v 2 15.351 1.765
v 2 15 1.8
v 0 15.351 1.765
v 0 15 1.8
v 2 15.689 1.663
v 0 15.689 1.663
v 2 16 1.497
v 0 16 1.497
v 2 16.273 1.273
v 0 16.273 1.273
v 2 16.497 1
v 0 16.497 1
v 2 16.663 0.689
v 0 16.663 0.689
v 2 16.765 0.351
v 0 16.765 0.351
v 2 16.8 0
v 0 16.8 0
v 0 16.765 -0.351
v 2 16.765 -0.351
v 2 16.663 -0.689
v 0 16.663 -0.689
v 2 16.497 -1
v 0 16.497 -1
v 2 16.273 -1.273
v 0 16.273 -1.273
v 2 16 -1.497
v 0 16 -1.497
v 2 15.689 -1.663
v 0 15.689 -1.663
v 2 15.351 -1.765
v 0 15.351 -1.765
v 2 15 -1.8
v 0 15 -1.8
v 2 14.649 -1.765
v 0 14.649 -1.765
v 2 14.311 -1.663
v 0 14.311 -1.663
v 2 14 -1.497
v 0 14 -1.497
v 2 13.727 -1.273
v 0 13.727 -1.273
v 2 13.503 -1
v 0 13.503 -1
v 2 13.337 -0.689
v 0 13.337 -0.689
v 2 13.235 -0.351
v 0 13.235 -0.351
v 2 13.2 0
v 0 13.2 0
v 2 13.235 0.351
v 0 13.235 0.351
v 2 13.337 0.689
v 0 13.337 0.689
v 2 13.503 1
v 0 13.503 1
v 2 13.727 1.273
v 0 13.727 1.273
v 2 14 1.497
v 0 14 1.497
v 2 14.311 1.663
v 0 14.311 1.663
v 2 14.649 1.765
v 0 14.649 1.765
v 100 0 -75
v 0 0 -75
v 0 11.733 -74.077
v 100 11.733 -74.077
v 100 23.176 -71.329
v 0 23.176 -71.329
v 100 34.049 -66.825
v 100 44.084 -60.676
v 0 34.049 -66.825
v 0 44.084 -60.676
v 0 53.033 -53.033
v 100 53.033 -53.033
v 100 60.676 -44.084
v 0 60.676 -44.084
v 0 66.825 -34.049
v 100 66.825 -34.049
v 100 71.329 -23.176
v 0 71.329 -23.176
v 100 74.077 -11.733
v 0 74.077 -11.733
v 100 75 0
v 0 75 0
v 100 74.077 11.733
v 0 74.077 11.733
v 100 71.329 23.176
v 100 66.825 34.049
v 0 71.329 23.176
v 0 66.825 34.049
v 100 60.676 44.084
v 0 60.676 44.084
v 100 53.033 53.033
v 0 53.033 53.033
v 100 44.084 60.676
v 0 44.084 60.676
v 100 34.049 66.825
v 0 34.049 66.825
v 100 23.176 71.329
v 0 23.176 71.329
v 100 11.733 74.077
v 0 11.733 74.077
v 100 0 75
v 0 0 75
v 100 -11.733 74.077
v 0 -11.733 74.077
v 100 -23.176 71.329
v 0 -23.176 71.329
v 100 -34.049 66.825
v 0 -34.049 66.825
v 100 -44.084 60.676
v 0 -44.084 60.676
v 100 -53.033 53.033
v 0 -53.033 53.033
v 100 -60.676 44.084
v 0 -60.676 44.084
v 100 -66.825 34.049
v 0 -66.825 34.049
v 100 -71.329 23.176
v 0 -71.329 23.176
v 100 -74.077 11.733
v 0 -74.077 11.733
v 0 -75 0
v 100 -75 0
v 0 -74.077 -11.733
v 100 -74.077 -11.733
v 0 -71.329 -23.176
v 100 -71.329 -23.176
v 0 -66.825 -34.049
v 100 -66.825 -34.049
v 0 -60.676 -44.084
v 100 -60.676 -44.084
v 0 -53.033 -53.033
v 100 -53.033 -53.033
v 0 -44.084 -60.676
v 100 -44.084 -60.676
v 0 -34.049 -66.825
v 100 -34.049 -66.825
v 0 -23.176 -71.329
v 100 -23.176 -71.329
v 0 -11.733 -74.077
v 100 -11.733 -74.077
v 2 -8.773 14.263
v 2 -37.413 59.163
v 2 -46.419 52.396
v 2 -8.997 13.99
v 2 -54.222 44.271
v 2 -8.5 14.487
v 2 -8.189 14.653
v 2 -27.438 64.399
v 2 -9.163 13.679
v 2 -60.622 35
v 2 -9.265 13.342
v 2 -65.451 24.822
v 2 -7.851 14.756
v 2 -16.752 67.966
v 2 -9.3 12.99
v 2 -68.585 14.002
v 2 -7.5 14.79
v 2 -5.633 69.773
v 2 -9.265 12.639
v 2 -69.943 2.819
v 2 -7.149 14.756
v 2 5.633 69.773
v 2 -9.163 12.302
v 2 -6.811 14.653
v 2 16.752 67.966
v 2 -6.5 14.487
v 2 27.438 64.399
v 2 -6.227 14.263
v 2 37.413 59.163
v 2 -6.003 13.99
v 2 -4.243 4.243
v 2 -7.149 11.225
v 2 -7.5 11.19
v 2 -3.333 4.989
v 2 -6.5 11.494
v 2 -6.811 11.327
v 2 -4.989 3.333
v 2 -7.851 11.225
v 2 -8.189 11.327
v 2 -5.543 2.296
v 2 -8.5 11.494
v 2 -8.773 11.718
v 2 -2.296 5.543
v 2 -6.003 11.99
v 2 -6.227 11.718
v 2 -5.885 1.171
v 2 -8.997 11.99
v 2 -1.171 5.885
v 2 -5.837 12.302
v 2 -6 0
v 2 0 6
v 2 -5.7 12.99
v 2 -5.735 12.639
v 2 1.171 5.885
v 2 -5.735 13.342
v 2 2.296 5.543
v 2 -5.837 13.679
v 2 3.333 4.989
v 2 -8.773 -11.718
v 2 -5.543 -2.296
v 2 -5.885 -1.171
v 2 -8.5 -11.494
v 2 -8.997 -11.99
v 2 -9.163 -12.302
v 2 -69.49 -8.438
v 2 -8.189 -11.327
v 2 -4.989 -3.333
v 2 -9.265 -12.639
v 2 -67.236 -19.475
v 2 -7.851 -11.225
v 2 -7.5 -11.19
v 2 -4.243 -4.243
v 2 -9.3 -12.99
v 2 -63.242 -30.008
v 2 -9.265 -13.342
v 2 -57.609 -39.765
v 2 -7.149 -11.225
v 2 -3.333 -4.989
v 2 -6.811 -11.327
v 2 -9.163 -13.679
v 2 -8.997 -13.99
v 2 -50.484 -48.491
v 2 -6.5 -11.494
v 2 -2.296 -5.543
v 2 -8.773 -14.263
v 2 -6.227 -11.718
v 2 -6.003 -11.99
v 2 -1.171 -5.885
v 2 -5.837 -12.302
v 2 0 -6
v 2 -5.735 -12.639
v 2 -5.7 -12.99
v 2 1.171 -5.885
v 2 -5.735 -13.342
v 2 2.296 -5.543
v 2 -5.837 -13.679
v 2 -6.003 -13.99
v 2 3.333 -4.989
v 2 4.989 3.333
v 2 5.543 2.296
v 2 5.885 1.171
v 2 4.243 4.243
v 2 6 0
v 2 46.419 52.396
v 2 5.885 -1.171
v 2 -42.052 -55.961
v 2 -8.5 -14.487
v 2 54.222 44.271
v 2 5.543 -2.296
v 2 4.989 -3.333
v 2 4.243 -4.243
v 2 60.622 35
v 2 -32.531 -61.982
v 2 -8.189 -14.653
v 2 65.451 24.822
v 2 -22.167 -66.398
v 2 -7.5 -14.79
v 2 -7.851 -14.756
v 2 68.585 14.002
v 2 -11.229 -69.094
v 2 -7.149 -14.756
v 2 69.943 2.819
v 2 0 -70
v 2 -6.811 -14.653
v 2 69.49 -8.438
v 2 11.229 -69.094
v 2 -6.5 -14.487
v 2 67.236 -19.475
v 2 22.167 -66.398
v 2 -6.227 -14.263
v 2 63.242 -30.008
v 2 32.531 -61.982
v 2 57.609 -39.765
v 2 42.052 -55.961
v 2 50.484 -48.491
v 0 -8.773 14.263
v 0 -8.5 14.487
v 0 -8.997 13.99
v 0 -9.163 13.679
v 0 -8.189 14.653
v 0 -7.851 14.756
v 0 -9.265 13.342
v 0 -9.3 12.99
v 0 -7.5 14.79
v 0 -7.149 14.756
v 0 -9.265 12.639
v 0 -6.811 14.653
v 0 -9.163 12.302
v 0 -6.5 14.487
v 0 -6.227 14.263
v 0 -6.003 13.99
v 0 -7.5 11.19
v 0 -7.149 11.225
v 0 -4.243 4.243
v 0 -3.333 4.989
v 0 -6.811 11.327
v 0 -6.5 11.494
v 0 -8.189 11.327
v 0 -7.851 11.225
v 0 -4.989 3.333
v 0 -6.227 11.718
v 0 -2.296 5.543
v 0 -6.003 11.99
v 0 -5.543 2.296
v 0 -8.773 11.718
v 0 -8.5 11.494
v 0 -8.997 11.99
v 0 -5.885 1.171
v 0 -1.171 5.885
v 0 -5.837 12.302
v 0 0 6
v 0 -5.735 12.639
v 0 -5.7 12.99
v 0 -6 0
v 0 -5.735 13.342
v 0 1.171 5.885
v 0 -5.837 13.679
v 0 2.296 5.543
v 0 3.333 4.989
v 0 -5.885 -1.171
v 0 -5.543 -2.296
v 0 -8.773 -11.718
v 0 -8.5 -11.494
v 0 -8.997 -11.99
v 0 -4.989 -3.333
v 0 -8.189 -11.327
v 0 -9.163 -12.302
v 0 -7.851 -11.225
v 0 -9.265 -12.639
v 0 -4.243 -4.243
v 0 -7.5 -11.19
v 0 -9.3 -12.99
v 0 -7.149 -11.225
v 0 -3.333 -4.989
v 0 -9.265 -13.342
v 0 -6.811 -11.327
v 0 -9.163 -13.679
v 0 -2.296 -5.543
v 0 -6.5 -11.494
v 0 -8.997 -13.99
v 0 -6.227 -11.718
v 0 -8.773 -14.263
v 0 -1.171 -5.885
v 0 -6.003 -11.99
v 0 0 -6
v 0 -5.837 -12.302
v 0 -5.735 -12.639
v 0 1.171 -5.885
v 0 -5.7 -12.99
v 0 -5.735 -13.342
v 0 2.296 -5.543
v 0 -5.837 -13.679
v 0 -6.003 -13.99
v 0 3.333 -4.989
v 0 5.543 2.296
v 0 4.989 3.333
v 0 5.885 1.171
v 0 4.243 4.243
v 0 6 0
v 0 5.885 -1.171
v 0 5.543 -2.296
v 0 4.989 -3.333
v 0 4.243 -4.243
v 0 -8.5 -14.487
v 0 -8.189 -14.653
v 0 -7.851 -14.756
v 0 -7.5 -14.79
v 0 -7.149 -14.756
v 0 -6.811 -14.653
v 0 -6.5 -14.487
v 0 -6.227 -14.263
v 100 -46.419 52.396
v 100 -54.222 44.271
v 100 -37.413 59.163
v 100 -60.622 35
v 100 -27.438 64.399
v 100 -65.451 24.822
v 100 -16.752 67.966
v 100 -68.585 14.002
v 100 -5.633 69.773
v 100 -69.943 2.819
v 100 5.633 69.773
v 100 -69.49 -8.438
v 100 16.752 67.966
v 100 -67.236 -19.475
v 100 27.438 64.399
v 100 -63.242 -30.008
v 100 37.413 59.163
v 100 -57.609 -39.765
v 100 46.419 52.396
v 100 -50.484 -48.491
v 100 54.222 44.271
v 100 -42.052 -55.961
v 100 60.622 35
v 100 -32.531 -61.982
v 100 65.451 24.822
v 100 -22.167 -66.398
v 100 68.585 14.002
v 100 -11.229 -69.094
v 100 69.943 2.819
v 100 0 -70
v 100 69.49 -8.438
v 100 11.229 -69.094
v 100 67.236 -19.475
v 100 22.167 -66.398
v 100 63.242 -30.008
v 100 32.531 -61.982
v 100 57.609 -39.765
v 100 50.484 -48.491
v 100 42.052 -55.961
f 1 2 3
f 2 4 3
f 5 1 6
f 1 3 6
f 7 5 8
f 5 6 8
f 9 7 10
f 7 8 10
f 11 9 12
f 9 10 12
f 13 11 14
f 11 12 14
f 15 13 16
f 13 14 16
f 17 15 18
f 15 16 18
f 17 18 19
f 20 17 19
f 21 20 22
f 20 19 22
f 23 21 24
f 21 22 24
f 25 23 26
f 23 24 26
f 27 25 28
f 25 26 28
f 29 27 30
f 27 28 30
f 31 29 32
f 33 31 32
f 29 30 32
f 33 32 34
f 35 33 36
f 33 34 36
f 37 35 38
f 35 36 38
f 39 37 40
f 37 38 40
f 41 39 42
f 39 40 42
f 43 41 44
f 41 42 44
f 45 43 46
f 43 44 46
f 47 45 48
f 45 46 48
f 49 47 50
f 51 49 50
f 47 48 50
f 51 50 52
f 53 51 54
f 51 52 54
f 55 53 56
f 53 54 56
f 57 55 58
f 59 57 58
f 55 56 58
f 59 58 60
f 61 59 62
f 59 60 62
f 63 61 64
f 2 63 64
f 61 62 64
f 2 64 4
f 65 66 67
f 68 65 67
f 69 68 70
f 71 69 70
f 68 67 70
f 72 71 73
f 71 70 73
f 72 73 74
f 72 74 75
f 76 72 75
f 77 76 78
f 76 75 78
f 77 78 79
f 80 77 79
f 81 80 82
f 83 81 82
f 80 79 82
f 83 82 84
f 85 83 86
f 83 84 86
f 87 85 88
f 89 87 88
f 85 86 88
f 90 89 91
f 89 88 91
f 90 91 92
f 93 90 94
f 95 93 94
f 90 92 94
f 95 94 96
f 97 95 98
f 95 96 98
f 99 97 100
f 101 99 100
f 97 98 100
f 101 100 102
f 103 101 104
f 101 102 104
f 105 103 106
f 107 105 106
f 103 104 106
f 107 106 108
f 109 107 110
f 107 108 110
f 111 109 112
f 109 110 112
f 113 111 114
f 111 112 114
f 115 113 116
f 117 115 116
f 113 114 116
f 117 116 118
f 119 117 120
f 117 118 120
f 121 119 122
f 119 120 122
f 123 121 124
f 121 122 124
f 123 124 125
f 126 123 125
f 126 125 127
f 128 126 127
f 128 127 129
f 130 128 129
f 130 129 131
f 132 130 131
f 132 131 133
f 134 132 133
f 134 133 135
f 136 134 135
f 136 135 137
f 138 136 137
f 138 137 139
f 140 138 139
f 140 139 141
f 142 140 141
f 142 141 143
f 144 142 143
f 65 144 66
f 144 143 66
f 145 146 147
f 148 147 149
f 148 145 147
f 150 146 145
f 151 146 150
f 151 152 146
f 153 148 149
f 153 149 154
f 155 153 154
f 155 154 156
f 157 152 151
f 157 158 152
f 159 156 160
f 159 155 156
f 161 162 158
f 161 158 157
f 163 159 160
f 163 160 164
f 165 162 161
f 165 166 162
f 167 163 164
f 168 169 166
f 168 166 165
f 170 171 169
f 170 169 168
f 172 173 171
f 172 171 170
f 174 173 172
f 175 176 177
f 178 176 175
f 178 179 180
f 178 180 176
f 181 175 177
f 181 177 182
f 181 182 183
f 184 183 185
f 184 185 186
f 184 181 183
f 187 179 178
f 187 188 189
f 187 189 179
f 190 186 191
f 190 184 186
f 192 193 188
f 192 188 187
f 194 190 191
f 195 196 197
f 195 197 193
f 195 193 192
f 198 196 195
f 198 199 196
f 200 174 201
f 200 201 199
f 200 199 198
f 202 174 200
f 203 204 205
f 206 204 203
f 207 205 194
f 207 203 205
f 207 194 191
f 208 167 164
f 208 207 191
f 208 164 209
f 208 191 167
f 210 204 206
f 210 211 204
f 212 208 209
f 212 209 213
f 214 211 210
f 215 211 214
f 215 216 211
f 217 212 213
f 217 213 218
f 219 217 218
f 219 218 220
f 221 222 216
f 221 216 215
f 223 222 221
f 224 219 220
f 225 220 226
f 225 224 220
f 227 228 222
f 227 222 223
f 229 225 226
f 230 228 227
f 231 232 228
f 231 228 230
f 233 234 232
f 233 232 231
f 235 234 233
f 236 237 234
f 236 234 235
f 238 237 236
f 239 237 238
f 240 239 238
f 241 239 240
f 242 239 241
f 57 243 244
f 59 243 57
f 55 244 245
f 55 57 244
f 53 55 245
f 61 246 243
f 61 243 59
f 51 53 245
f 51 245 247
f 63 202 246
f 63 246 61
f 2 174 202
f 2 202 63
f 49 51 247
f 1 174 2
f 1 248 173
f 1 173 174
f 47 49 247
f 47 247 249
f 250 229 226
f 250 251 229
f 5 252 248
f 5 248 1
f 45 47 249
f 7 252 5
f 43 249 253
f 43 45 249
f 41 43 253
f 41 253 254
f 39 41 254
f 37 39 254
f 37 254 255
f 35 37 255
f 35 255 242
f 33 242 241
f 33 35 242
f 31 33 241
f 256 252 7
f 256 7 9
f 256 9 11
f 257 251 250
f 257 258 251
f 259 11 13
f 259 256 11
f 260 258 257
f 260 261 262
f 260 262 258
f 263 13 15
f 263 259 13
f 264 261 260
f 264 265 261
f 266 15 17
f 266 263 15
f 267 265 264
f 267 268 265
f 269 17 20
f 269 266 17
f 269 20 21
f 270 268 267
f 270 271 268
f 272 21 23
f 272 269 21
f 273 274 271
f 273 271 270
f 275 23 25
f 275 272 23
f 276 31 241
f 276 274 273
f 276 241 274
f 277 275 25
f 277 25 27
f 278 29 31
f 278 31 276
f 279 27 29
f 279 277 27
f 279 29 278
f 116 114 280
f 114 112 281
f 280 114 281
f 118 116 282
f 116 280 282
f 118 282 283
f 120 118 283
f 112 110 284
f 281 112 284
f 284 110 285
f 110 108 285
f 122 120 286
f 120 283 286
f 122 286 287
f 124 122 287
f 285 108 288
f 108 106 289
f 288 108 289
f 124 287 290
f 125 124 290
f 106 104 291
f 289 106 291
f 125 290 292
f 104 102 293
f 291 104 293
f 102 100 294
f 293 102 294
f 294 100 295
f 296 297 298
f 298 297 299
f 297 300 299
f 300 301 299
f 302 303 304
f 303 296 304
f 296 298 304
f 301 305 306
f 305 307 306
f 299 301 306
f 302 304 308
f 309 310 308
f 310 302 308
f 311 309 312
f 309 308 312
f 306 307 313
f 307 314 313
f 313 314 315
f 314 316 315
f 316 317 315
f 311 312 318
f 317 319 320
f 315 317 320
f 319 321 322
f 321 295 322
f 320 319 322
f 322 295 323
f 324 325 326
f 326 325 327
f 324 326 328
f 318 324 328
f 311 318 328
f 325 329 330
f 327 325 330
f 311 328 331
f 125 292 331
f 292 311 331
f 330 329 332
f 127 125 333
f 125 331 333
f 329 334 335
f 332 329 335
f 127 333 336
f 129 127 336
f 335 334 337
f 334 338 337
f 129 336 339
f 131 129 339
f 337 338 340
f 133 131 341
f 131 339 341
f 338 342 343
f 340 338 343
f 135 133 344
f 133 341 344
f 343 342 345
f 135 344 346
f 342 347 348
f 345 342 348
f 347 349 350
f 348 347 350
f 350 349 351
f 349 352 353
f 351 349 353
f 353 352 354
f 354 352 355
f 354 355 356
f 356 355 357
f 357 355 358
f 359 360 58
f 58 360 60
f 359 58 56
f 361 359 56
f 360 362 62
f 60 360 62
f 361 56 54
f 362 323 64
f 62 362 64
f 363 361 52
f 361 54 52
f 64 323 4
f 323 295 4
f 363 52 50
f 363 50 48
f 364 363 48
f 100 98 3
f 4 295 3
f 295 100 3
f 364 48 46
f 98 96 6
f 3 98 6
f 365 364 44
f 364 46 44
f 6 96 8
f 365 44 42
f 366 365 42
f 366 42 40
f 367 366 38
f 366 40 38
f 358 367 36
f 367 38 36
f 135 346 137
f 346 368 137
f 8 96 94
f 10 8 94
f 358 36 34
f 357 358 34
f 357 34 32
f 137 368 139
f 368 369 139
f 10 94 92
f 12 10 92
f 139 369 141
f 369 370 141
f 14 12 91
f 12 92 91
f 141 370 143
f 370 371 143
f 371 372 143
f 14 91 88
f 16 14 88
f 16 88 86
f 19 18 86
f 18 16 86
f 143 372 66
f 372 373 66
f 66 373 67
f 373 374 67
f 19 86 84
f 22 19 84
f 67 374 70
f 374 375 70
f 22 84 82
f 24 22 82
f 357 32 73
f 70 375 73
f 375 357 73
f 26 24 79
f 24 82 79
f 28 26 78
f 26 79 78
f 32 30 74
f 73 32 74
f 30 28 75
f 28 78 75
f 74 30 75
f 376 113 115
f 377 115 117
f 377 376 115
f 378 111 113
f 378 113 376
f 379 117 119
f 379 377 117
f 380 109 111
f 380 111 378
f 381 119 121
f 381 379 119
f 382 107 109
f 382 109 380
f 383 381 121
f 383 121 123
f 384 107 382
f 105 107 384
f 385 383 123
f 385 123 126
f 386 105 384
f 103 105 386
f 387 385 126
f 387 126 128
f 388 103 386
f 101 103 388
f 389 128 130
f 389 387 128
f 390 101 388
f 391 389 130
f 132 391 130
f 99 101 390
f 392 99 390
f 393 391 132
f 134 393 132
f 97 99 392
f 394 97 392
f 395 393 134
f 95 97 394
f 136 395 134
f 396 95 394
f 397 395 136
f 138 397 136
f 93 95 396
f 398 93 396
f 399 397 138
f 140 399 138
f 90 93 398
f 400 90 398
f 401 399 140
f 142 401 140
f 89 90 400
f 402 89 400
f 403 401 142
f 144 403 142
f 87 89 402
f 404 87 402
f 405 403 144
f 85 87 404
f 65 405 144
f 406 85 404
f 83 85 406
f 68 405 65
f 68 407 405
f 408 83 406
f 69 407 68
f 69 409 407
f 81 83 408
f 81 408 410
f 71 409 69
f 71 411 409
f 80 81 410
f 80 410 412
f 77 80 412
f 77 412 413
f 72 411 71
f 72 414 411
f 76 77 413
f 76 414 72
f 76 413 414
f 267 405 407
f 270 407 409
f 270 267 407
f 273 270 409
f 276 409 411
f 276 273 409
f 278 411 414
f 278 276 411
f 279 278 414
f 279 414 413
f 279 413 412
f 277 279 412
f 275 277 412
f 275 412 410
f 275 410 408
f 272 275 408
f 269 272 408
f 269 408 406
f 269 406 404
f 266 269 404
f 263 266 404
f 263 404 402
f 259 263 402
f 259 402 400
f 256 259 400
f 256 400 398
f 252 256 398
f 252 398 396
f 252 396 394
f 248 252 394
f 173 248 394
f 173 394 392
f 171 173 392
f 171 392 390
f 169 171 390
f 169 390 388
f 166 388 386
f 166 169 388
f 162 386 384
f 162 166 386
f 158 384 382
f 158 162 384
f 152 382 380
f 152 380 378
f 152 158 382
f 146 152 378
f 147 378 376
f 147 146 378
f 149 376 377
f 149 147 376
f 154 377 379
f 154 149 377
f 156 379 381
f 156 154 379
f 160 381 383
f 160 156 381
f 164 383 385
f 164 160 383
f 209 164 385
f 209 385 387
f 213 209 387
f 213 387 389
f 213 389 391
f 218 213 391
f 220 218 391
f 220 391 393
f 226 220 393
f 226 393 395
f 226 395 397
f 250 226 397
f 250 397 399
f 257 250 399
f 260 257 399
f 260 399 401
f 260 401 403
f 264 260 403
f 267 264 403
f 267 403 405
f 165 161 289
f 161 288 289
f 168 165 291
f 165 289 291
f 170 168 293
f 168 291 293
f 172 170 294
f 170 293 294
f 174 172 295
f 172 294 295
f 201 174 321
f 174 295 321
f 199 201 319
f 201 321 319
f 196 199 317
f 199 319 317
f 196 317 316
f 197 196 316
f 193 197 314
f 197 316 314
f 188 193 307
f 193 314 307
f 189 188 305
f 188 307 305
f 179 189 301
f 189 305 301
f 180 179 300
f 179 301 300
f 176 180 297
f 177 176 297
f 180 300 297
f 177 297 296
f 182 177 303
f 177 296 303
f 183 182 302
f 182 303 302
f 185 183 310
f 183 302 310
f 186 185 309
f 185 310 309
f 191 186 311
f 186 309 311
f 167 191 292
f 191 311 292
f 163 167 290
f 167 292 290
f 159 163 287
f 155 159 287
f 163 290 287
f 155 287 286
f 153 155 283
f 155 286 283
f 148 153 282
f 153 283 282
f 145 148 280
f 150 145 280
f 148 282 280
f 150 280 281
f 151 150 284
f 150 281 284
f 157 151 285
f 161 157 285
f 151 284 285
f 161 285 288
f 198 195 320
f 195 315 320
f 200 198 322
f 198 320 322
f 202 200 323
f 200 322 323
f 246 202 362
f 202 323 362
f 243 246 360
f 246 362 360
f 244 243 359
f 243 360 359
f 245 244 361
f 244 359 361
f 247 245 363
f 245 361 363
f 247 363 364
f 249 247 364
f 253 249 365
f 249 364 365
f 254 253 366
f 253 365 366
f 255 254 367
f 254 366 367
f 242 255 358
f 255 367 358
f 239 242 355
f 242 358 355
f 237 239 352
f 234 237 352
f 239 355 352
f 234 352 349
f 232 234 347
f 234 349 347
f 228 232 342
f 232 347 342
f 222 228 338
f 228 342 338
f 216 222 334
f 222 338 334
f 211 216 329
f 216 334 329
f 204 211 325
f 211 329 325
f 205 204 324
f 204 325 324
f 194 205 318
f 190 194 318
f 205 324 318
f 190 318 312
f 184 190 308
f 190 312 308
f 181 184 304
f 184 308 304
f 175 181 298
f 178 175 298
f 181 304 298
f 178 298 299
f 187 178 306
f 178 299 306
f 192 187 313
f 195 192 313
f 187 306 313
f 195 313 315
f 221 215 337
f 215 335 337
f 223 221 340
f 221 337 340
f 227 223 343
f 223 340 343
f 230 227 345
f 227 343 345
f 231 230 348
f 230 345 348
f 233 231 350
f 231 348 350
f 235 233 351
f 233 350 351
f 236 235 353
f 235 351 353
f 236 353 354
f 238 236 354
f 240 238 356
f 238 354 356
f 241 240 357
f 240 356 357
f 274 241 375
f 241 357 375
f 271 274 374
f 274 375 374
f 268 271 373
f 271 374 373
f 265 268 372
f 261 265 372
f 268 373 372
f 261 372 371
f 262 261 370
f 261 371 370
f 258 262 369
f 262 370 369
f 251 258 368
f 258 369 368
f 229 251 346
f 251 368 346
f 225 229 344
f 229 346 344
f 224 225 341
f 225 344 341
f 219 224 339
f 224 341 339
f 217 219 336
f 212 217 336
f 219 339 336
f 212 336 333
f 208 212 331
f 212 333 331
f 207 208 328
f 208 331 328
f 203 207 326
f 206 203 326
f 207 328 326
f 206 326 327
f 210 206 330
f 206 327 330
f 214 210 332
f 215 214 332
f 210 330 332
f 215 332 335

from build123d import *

# Parameters (mm, degrees)
SKETCH1_R                 = 70
BOSS_EXTRUDE1_DEPTH       = 2
SKETCH1_4_R               = 75
SKETCH1_4_R_2             = 70
BOSS_EXTRUDE2_DEPTH       = 100
M3_CLEARANCE_HOLE1_D      = 3.6
M3_CLEARANCE_HOLE1_DEPTH  = 2
M3_CLEARANCE_HOLE1_TIP    = 1.081549114
M10_CLEARANCE_HOLE1_D     = 12
M10_CLEARANCE_HOLE1_DEPTH = 2
M10_CLEARANCE_HOLE1_TIP   = 3.605163714


with BuildPart() as part:
    # Sketch1 → Boss-Extrude1 (new body)
    with BuildSketch(Plane(origin=(0, 0, 0), x_dir=(0, 0, -1), z_dir=(1, 0, 0))):
        Circle(SKETCH1_R)
    extrude(amount=BOSS_EXTRUDE1_DEPTH)

    # Sketch1<4> → Boss-Extrude2 (add)
    with BuildSketch(Plane(origin=(0, 0, 0), x_dir=(0, 0, -1), z_dir=(1, 0, 0))):
        Circle(SKETCH1_4_R)
        Circle(SKETCH1_4_R_2, mode=Mode.SUBTRACT)
    extrude(amount=BOSS_EXTRUDE2_DEPTH)

    # M3 Clearance Hole1
    with Locations(Plane(origin=(2, 0, 0), x_dir=(0, 0, -1), z_dir=(1, 0, 0))):
        with Locations((12.990381057, -7.5), (0, 15), (-12.990381057, -7.5)):
            Hole(M3_CLEARANCE_HOLE1_D / 2, depth=M3_CLEARANCE_HOLE1_DEPTH)
            with Locations((0, 0, -(M3_CLEARANCE_HOLE1_DEPTH + M3_CLEARANCE_HOLE1_TIP / 2))):  # 118° drill point
                Cone(0, M3_CLEARANCE_HOLE1_D / 2, M3_CLEARANCE_HOLE1_TIP, mode=Mode.SUBTRACT)

    # M10 Clearance Hole1
    with Locations(Plane(origin=(2, 0, 0), x_dir=(0, 0, -1), z_dir=(1, 0, 0))):
        with Locations((0, 0)):
            Hole(M10_CLEARANCE_HOLE1_D / 2, depth=M10_CLEARANCE_HOLE1_DEPTH)
            with Locations((0, 0, -(M10_CLEARANCE_HOLE1_DEPTH + M10_CLEARANCE_HOLE1_TIP / 2))):  # 118° drill point
                Cone(0, M10_CLEARANCE_HOLE1_D / 2, M10_CLEARANCE_HOLE1_TIP, mode=Mode.SUBTRACT)


solid = part.part
